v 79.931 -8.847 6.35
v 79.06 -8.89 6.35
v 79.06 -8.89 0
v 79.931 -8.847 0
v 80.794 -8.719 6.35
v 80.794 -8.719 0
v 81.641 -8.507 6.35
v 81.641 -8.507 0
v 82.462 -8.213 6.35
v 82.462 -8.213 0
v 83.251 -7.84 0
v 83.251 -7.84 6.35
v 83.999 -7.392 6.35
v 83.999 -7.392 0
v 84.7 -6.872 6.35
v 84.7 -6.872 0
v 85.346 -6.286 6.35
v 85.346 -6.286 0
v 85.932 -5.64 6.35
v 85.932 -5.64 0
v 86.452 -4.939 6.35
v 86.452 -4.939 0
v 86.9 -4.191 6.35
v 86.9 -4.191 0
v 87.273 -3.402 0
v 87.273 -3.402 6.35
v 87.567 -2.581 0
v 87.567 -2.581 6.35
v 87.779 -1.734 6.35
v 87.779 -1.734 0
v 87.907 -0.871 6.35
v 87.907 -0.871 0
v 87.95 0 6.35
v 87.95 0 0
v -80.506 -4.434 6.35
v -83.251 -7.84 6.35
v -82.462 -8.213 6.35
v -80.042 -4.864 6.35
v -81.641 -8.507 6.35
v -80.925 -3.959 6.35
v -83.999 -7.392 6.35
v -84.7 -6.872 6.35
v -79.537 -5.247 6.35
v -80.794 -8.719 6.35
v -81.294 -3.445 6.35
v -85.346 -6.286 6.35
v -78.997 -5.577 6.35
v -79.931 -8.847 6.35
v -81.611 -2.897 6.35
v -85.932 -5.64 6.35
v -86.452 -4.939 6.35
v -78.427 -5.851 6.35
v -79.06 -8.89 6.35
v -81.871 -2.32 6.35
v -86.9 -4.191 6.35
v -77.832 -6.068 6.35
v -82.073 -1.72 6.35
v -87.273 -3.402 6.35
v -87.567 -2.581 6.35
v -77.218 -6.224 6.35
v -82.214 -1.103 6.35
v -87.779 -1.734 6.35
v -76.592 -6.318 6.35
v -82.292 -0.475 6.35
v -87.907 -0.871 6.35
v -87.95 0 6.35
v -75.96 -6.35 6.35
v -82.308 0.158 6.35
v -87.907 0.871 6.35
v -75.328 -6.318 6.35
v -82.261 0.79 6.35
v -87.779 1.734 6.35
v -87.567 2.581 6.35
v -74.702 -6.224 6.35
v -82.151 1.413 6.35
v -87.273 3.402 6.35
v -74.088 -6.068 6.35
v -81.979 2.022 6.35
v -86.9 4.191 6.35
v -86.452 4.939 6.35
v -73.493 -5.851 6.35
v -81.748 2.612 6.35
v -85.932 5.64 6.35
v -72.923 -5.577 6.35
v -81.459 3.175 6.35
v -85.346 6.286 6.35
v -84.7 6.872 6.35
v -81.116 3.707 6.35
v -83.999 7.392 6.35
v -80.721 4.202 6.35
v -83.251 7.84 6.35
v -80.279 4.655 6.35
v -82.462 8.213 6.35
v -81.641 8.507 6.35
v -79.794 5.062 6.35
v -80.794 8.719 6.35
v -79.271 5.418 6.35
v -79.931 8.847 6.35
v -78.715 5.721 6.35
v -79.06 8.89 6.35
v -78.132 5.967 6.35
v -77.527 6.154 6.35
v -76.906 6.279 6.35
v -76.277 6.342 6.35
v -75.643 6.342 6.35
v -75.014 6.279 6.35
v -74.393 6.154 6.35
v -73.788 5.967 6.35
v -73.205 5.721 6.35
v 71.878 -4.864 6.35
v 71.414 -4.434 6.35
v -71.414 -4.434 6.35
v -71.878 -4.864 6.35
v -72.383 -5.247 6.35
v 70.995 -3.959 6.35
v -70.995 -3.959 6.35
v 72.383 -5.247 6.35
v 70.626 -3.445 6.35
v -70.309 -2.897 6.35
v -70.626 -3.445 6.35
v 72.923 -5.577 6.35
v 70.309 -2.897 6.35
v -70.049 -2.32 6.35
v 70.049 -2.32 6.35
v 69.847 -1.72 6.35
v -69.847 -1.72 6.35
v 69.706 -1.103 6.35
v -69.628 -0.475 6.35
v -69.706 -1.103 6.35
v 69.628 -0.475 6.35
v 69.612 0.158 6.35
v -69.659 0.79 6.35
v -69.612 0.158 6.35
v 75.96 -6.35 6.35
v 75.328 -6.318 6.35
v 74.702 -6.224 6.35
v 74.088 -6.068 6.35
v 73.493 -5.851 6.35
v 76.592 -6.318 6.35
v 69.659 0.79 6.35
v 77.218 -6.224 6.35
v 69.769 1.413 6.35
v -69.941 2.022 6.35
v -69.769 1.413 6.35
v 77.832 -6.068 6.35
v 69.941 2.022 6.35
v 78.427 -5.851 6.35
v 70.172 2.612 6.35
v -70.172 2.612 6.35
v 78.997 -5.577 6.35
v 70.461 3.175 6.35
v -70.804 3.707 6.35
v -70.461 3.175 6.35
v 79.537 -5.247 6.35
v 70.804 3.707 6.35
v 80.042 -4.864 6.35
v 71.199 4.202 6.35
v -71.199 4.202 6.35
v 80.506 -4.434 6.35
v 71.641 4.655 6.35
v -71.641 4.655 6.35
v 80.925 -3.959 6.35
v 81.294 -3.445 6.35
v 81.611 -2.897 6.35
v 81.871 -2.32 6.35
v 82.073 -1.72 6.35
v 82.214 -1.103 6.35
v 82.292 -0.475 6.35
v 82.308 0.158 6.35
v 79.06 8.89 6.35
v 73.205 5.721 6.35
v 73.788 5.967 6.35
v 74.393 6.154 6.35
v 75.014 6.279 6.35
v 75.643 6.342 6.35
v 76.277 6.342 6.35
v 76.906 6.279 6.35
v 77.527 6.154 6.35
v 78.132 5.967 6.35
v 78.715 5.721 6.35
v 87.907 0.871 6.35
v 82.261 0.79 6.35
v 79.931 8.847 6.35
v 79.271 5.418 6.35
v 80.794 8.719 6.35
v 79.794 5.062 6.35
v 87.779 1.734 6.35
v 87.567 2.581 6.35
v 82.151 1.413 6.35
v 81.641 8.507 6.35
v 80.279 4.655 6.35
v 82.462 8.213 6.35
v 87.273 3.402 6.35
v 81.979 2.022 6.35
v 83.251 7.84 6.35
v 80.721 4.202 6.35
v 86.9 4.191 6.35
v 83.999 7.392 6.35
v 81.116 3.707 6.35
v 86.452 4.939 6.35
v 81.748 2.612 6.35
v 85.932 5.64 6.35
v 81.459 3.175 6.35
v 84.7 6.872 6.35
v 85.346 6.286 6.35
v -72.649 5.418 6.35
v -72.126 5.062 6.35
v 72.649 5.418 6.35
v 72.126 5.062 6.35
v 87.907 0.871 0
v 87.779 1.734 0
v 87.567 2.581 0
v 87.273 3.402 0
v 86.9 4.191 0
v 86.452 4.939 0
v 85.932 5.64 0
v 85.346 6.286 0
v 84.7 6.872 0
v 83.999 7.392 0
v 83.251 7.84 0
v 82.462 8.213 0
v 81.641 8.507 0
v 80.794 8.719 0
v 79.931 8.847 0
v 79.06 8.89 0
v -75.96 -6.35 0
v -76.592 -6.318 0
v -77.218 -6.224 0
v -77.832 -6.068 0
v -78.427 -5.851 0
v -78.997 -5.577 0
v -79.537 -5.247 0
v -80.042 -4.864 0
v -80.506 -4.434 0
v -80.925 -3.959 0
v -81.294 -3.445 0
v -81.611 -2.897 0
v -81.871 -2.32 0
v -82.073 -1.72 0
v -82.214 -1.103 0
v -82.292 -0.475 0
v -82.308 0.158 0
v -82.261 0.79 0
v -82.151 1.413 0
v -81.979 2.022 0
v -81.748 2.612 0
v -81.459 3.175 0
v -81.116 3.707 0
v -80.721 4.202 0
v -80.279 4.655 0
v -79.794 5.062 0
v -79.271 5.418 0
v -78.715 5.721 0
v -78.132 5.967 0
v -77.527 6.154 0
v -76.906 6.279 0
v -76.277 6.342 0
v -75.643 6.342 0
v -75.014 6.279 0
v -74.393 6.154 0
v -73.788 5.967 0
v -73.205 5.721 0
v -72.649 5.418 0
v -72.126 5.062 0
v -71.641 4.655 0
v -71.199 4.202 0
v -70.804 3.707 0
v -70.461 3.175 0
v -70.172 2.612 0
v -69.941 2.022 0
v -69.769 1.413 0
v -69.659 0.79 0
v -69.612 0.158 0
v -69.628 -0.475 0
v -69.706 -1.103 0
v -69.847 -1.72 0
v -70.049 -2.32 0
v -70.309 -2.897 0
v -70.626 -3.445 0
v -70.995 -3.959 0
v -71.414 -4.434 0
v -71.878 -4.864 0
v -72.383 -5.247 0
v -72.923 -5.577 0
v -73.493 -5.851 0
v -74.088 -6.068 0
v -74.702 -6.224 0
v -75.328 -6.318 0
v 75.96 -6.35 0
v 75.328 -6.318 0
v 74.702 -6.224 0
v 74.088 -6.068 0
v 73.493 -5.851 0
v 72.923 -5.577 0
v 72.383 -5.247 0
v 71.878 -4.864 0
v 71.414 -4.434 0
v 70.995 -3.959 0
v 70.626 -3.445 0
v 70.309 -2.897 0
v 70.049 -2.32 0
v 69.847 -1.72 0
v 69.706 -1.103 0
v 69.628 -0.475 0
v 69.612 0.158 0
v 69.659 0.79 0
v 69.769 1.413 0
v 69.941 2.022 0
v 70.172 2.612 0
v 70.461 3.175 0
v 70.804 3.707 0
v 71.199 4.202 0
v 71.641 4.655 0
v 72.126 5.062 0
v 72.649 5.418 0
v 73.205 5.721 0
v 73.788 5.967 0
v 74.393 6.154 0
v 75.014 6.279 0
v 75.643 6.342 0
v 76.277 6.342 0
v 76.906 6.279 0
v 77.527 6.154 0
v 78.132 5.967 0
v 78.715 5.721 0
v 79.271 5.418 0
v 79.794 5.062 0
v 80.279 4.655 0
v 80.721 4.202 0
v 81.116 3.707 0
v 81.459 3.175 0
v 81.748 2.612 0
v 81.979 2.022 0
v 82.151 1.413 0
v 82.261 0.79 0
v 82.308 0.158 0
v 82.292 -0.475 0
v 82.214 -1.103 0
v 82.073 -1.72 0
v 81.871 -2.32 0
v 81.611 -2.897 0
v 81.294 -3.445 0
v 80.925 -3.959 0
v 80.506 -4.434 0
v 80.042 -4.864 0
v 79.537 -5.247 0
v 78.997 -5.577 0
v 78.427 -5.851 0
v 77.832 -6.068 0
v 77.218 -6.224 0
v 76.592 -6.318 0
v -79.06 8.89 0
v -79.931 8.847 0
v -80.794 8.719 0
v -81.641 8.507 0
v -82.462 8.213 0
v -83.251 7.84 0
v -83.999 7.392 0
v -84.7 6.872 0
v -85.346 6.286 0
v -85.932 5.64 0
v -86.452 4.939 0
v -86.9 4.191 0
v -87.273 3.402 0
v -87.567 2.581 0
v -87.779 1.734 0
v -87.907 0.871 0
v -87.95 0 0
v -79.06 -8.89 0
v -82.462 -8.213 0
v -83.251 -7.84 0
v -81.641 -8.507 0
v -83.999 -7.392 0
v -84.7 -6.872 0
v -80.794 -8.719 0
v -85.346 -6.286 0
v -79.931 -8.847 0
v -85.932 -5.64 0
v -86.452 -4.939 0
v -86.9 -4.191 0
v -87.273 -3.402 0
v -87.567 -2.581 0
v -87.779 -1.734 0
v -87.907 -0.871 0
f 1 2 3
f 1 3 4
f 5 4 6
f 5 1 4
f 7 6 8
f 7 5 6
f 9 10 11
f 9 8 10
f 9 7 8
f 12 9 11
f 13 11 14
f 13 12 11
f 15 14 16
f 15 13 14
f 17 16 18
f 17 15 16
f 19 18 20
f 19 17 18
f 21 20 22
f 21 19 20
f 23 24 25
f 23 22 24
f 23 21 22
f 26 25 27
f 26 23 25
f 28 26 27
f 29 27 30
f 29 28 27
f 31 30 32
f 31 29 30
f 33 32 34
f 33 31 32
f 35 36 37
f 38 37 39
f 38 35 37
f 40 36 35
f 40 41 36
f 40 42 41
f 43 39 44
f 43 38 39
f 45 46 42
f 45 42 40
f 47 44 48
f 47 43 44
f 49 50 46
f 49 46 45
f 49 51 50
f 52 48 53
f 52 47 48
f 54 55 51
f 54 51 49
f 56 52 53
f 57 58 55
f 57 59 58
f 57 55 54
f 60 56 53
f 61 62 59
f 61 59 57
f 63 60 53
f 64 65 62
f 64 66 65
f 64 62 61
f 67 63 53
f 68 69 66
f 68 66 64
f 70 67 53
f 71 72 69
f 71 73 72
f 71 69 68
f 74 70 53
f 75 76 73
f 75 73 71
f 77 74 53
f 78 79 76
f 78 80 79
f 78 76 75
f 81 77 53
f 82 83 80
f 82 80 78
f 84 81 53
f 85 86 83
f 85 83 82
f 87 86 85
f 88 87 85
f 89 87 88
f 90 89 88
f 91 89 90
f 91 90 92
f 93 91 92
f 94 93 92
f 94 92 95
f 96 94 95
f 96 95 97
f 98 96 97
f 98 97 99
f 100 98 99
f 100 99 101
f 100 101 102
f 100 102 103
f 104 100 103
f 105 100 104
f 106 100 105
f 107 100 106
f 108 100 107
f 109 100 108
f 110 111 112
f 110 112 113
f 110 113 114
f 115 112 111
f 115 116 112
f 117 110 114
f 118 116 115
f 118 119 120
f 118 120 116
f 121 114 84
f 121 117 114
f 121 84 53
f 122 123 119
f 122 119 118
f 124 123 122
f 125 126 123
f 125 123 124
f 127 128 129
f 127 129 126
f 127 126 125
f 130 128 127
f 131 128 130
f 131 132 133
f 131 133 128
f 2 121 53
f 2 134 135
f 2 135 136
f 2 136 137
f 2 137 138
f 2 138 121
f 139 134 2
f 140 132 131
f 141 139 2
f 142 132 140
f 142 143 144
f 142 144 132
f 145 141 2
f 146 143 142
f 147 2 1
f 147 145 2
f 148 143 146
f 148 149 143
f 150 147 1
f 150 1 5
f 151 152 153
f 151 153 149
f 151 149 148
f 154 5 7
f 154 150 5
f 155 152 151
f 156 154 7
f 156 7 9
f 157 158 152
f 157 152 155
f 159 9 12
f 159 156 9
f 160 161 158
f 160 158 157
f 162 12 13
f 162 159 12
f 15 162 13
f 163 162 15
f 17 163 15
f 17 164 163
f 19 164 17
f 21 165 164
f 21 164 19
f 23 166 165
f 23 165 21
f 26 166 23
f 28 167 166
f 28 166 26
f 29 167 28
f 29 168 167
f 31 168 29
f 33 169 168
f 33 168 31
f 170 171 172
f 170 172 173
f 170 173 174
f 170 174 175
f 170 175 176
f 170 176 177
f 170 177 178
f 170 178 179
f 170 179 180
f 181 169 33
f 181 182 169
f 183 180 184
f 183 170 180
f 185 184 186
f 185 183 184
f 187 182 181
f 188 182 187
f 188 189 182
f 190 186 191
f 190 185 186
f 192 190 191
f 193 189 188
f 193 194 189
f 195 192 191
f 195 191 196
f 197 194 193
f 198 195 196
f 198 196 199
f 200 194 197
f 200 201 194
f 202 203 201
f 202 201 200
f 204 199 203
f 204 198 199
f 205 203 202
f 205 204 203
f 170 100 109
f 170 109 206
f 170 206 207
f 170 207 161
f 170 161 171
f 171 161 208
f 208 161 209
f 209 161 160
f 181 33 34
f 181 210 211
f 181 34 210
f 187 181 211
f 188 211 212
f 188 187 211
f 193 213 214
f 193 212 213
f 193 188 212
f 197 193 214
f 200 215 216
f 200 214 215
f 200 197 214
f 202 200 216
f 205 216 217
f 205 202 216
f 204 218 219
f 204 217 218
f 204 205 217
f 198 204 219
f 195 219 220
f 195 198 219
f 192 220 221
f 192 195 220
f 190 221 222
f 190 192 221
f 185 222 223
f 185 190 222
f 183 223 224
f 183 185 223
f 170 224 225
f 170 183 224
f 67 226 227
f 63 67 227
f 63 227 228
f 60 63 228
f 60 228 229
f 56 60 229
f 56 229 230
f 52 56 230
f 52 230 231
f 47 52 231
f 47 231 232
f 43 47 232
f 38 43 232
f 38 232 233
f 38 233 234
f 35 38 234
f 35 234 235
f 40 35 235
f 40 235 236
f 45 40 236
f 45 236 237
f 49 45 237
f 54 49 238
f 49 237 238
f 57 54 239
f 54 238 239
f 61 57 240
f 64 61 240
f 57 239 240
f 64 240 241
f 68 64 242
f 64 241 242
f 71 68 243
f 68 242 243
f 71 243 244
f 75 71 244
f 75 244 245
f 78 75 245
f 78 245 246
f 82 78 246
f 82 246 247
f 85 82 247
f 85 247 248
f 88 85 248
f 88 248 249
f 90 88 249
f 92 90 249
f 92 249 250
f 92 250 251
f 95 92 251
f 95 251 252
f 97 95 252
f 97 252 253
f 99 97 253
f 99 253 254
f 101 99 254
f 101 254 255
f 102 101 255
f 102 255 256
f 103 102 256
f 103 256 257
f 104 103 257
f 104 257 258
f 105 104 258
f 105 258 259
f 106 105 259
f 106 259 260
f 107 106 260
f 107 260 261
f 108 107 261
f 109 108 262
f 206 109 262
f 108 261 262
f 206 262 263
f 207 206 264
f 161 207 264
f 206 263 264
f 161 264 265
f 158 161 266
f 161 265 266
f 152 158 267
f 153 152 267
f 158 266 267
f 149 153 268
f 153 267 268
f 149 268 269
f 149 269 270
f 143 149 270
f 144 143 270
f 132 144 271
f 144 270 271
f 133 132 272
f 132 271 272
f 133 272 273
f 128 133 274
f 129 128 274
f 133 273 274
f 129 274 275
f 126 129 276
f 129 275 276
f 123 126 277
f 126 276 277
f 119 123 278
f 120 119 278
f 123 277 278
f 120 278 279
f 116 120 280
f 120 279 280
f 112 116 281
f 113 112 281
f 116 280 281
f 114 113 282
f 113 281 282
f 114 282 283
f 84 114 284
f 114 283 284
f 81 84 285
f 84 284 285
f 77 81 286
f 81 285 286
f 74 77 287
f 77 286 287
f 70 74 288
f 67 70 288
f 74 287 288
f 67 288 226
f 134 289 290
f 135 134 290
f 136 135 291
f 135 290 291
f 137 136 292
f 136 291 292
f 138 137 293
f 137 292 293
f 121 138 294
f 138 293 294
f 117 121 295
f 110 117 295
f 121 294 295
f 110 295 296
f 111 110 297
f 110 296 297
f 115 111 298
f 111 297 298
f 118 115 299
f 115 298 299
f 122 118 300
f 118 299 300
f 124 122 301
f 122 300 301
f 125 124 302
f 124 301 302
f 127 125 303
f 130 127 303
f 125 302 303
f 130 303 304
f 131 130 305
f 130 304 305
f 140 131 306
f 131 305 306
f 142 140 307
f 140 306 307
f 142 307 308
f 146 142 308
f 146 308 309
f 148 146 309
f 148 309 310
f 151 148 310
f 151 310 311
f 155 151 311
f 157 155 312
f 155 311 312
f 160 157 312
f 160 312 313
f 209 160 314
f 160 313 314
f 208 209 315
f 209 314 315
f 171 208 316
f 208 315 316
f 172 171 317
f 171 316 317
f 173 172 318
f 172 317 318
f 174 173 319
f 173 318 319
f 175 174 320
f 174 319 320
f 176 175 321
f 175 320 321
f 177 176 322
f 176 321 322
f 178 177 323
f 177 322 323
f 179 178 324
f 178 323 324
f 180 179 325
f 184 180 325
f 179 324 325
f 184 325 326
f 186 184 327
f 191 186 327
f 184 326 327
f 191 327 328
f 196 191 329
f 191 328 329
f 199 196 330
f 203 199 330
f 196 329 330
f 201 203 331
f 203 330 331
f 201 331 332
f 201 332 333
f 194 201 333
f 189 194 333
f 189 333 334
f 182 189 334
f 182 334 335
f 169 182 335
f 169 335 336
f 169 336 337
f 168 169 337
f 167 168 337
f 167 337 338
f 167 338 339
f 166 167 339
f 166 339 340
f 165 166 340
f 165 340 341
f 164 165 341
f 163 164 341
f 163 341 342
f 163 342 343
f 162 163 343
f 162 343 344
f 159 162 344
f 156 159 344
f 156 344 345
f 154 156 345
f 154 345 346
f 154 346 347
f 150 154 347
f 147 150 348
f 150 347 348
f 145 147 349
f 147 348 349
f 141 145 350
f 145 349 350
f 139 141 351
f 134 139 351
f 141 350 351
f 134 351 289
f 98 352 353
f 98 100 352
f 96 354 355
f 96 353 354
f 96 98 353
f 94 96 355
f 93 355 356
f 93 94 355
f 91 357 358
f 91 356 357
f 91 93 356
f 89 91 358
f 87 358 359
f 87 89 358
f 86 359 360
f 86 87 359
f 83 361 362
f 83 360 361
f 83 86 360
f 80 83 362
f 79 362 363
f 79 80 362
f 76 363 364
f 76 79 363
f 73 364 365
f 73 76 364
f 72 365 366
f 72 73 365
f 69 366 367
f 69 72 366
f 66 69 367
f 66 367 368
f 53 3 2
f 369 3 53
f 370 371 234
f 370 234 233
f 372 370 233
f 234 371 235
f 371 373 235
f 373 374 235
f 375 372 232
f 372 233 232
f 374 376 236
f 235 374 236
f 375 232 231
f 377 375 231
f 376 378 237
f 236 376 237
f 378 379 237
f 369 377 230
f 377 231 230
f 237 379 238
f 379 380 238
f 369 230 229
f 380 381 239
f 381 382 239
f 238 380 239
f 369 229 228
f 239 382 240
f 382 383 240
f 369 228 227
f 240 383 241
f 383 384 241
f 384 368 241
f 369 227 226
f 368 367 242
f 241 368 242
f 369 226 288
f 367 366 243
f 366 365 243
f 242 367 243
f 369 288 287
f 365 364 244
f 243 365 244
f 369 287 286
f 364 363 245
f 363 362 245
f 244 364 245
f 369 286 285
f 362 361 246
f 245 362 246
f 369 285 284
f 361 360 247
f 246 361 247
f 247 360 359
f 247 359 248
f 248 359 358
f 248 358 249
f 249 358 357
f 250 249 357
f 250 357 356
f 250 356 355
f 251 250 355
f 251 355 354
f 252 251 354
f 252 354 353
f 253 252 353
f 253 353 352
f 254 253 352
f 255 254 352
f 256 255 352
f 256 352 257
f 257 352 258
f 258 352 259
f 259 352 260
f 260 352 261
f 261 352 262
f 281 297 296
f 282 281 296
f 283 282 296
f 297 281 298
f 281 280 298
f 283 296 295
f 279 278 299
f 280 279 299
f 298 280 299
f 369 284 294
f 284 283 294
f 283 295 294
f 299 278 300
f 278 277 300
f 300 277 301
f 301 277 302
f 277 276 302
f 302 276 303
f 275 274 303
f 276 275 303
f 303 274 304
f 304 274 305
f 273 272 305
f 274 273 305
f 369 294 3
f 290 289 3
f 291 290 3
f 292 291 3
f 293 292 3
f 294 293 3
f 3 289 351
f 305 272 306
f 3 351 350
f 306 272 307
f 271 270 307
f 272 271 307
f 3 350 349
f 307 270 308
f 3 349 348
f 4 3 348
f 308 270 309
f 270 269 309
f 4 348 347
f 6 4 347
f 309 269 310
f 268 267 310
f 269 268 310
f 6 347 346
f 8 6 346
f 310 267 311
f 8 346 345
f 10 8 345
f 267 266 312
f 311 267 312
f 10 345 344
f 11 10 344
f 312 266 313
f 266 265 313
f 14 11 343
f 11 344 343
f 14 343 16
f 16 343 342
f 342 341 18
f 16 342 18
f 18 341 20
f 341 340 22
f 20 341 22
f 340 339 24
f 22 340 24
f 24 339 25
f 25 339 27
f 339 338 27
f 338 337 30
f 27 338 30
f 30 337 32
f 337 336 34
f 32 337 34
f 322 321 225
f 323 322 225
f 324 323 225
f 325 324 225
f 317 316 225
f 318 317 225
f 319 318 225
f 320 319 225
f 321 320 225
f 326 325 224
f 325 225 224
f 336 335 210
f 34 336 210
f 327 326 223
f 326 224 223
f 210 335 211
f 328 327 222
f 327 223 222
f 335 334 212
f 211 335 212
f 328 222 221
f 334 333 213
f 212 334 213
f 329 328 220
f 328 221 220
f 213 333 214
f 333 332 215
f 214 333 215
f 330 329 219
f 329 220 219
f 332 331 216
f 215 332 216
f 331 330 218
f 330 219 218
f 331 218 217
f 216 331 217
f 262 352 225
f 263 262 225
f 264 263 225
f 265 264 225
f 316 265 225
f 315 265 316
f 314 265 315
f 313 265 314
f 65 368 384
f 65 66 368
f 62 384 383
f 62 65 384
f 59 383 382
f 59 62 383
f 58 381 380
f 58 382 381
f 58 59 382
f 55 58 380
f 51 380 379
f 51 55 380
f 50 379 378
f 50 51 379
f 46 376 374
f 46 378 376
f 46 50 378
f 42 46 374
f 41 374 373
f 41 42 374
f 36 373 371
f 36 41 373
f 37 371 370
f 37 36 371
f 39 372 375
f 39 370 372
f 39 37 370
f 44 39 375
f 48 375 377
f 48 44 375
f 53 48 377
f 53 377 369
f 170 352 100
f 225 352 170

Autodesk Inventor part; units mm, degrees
ref_plane "YZ Plane" through (0, 0, 0) normal (1, 0, 0) x (0, 1, 0)
ref_plane "XZ Plane" through (0, 0, 0) normal (0, 1, 0) x (-1, 0, 0)
ref_plane "XY Plane" through (0, 0, 0) normal (0, 0, 1) x (1, 0, 0)
sketch "Sketch1" plane through (0, 0, 0) normal (0, 0, 1) x (1, 0, 0)
  line L0 (-87.95, 8.89) -> (87.95, 8.89)
  line L1 (87.95, 8.89) -> (87.95, -8.89)
  line L2 (87.95, -8.89) -> (-87.95, -8.89)
  line L3 (-87.95, -8.89) -> (-87.95, 8.89)
  line L4 (-87.95, 8.89) -> (87.95, -8.89) construction
  line L5 (87.95, 8.89) -> (-87.95, -8.89) construction
  point P0 (0, 0)
  dimension "d0" = 175.9
  dimension "d1" = 17.78
extrude "Extrusion1" add sketch "Sketch1" along normal blind 6.35
fillet "Fillet1" radius 8.89 1 edges at (87.95, 8.89, 3.175)
fillet "Fillet2" radius 8.89 1 edges at (87.95, -8.89, 3.175)
fillet "Fillet3" radius 8.89 1 edges at (-87.95, -8.89, 3.175)
fillet "Fillet4" radius 8.89 1 edges at (-87.95, 8.89, 3.175)
sketch "Sketch2" plane through (0, 0, 6.35) normal (0, 0, 1) x (1, 0, 0)
  arc A0 (79.06, -8.89) -> (79.06, 8.89) centre (79.06, 0) ccw projected
  circle A1 centre (-75.96, 0) radius 6.35
  circle A2 centre (75.96, 0) radius 6.35
  arc A3 (-79.06, 8.89) -> (-79.06, -8.89) centre (-79.06, 0) ccw projected
  point P0 (0, 0)
  dimension "d10" = 12.7
  dimension "d12" = 12.7
  dimension "d13" = 3.1
  dimension "d14" = 3.1
hole "Hole1" at (-75.96, 0, 6.35) at (75.96, 0, 6.35) direction (0, 0, -1) diameter 12.7 end through all
equation "\"d20\" = Thickness"
equation "\"BendRadius\" = Thickness"
equation "\"BendReliefWidth\" = Thickness"
equation "\"BendReliefDepth\" = 0.5 * Thickness"
equation "\"CornerReliefSize\" = 4 * Thickness"
equation "\"MinimumRemnant\" = 2 * Thickness"
equation "\"TransitionRadius\" = BendRadius"
equation "\"JacobiRadiusSize\" = BendRadius"
equation "\"GapSize\" = Thickness"
equation "\"Thickness\" = 3.048"
properties part number "crank part"
